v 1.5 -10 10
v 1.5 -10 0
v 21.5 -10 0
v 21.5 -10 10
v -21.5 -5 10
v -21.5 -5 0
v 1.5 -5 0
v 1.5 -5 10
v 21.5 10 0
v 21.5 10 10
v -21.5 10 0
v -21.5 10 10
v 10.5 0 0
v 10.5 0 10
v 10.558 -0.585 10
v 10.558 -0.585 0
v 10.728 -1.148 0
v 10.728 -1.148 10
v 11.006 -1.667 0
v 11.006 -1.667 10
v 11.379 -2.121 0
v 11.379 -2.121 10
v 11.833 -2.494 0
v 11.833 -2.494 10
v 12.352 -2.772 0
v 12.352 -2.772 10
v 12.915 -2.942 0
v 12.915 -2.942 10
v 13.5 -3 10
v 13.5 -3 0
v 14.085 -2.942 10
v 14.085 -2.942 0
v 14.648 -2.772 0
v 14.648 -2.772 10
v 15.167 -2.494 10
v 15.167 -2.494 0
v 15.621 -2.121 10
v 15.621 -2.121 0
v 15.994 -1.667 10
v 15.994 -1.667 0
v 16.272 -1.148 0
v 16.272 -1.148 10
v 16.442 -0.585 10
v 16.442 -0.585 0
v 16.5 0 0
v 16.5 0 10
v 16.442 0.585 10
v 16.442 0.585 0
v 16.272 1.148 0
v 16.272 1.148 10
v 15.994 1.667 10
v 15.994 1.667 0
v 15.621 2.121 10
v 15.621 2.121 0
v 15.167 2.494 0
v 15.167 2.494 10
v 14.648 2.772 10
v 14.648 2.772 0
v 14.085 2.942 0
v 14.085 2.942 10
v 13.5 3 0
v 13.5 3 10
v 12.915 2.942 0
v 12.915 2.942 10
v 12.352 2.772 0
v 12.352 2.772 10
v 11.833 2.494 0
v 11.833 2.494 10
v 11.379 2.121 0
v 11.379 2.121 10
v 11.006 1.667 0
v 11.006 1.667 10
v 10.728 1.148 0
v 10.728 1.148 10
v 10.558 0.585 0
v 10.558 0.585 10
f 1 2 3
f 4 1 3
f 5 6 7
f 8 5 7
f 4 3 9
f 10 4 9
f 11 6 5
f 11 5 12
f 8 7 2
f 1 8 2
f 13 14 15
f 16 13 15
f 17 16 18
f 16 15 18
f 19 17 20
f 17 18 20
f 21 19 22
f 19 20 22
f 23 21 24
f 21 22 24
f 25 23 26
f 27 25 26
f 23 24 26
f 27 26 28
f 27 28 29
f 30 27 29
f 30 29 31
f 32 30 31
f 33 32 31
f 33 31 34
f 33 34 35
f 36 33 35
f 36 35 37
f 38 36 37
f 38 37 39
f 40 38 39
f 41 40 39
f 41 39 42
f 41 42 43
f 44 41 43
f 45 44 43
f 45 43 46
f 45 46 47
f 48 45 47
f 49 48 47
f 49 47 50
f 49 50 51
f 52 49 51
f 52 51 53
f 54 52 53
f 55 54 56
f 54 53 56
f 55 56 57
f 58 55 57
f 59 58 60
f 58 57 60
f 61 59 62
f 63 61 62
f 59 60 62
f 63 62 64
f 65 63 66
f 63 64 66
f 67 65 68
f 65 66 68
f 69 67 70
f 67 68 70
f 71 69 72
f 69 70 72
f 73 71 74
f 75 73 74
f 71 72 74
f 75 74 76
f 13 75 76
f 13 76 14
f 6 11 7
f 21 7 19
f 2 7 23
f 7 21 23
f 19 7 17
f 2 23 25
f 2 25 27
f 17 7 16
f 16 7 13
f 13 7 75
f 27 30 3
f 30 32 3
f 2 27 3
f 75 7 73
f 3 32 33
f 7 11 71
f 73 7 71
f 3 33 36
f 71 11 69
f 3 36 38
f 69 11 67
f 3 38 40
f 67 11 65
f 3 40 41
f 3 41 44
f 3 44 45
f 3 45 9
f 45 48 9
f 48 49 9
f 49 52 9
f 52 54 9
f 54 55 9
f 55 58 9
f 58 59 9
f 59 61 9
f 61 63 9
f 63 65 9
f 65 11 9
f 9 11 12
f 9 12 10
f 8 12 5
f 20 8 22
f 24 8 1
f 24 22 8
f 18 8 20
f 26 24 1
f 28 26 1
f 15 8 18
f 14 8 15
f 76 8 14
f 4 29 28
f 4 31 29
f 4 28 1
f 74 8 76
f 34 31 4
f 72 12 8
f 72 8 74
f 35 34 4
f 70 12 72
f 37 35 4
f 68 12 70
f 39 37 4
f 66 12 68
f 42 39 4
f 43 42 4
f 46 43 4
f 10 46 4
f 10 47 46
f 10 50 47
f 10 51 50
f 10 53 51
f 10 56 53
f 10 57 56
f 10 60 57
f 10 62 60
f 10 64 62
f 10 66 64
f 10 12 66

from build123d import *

# Parameters (mm, degrees)
F0_W     = 43
F0_H     = 20
F1_DEPTH = 10
F2_D     = 6
F3_W     = 23
F3_H     = 5
F4_DEPTH = 10


with BuildPart() as f1:
    # F0 (on Top) → F1 (new body)
    with BuildSketch(Plane.XY):
        Rectangle(F0_W, F0_H)
    extrude(amount=F1_DEPTH)

    # F2 (through all)
    with Locations(Plane(origin=(0, 0, 0), x_dir=(1, 0, 0), z_dir=(0, 0, -1))):
        with Locations((13.5, 0)):
            Hole(F2_D / 2)

    # F3 (on face) → F4 (cut)
    with BuildSketch(Plane(origin=(0, 0, 0), x_dir=(1, 0, 0), z_dir=(0, 0, -1))):
        with Locations((-10, 7.5)):
            Rectangle(F3_W, F3_H)
    extrude(amount=-F4_DEPTH, mode=Mode.SUBTRACT)


solid = f1.part
